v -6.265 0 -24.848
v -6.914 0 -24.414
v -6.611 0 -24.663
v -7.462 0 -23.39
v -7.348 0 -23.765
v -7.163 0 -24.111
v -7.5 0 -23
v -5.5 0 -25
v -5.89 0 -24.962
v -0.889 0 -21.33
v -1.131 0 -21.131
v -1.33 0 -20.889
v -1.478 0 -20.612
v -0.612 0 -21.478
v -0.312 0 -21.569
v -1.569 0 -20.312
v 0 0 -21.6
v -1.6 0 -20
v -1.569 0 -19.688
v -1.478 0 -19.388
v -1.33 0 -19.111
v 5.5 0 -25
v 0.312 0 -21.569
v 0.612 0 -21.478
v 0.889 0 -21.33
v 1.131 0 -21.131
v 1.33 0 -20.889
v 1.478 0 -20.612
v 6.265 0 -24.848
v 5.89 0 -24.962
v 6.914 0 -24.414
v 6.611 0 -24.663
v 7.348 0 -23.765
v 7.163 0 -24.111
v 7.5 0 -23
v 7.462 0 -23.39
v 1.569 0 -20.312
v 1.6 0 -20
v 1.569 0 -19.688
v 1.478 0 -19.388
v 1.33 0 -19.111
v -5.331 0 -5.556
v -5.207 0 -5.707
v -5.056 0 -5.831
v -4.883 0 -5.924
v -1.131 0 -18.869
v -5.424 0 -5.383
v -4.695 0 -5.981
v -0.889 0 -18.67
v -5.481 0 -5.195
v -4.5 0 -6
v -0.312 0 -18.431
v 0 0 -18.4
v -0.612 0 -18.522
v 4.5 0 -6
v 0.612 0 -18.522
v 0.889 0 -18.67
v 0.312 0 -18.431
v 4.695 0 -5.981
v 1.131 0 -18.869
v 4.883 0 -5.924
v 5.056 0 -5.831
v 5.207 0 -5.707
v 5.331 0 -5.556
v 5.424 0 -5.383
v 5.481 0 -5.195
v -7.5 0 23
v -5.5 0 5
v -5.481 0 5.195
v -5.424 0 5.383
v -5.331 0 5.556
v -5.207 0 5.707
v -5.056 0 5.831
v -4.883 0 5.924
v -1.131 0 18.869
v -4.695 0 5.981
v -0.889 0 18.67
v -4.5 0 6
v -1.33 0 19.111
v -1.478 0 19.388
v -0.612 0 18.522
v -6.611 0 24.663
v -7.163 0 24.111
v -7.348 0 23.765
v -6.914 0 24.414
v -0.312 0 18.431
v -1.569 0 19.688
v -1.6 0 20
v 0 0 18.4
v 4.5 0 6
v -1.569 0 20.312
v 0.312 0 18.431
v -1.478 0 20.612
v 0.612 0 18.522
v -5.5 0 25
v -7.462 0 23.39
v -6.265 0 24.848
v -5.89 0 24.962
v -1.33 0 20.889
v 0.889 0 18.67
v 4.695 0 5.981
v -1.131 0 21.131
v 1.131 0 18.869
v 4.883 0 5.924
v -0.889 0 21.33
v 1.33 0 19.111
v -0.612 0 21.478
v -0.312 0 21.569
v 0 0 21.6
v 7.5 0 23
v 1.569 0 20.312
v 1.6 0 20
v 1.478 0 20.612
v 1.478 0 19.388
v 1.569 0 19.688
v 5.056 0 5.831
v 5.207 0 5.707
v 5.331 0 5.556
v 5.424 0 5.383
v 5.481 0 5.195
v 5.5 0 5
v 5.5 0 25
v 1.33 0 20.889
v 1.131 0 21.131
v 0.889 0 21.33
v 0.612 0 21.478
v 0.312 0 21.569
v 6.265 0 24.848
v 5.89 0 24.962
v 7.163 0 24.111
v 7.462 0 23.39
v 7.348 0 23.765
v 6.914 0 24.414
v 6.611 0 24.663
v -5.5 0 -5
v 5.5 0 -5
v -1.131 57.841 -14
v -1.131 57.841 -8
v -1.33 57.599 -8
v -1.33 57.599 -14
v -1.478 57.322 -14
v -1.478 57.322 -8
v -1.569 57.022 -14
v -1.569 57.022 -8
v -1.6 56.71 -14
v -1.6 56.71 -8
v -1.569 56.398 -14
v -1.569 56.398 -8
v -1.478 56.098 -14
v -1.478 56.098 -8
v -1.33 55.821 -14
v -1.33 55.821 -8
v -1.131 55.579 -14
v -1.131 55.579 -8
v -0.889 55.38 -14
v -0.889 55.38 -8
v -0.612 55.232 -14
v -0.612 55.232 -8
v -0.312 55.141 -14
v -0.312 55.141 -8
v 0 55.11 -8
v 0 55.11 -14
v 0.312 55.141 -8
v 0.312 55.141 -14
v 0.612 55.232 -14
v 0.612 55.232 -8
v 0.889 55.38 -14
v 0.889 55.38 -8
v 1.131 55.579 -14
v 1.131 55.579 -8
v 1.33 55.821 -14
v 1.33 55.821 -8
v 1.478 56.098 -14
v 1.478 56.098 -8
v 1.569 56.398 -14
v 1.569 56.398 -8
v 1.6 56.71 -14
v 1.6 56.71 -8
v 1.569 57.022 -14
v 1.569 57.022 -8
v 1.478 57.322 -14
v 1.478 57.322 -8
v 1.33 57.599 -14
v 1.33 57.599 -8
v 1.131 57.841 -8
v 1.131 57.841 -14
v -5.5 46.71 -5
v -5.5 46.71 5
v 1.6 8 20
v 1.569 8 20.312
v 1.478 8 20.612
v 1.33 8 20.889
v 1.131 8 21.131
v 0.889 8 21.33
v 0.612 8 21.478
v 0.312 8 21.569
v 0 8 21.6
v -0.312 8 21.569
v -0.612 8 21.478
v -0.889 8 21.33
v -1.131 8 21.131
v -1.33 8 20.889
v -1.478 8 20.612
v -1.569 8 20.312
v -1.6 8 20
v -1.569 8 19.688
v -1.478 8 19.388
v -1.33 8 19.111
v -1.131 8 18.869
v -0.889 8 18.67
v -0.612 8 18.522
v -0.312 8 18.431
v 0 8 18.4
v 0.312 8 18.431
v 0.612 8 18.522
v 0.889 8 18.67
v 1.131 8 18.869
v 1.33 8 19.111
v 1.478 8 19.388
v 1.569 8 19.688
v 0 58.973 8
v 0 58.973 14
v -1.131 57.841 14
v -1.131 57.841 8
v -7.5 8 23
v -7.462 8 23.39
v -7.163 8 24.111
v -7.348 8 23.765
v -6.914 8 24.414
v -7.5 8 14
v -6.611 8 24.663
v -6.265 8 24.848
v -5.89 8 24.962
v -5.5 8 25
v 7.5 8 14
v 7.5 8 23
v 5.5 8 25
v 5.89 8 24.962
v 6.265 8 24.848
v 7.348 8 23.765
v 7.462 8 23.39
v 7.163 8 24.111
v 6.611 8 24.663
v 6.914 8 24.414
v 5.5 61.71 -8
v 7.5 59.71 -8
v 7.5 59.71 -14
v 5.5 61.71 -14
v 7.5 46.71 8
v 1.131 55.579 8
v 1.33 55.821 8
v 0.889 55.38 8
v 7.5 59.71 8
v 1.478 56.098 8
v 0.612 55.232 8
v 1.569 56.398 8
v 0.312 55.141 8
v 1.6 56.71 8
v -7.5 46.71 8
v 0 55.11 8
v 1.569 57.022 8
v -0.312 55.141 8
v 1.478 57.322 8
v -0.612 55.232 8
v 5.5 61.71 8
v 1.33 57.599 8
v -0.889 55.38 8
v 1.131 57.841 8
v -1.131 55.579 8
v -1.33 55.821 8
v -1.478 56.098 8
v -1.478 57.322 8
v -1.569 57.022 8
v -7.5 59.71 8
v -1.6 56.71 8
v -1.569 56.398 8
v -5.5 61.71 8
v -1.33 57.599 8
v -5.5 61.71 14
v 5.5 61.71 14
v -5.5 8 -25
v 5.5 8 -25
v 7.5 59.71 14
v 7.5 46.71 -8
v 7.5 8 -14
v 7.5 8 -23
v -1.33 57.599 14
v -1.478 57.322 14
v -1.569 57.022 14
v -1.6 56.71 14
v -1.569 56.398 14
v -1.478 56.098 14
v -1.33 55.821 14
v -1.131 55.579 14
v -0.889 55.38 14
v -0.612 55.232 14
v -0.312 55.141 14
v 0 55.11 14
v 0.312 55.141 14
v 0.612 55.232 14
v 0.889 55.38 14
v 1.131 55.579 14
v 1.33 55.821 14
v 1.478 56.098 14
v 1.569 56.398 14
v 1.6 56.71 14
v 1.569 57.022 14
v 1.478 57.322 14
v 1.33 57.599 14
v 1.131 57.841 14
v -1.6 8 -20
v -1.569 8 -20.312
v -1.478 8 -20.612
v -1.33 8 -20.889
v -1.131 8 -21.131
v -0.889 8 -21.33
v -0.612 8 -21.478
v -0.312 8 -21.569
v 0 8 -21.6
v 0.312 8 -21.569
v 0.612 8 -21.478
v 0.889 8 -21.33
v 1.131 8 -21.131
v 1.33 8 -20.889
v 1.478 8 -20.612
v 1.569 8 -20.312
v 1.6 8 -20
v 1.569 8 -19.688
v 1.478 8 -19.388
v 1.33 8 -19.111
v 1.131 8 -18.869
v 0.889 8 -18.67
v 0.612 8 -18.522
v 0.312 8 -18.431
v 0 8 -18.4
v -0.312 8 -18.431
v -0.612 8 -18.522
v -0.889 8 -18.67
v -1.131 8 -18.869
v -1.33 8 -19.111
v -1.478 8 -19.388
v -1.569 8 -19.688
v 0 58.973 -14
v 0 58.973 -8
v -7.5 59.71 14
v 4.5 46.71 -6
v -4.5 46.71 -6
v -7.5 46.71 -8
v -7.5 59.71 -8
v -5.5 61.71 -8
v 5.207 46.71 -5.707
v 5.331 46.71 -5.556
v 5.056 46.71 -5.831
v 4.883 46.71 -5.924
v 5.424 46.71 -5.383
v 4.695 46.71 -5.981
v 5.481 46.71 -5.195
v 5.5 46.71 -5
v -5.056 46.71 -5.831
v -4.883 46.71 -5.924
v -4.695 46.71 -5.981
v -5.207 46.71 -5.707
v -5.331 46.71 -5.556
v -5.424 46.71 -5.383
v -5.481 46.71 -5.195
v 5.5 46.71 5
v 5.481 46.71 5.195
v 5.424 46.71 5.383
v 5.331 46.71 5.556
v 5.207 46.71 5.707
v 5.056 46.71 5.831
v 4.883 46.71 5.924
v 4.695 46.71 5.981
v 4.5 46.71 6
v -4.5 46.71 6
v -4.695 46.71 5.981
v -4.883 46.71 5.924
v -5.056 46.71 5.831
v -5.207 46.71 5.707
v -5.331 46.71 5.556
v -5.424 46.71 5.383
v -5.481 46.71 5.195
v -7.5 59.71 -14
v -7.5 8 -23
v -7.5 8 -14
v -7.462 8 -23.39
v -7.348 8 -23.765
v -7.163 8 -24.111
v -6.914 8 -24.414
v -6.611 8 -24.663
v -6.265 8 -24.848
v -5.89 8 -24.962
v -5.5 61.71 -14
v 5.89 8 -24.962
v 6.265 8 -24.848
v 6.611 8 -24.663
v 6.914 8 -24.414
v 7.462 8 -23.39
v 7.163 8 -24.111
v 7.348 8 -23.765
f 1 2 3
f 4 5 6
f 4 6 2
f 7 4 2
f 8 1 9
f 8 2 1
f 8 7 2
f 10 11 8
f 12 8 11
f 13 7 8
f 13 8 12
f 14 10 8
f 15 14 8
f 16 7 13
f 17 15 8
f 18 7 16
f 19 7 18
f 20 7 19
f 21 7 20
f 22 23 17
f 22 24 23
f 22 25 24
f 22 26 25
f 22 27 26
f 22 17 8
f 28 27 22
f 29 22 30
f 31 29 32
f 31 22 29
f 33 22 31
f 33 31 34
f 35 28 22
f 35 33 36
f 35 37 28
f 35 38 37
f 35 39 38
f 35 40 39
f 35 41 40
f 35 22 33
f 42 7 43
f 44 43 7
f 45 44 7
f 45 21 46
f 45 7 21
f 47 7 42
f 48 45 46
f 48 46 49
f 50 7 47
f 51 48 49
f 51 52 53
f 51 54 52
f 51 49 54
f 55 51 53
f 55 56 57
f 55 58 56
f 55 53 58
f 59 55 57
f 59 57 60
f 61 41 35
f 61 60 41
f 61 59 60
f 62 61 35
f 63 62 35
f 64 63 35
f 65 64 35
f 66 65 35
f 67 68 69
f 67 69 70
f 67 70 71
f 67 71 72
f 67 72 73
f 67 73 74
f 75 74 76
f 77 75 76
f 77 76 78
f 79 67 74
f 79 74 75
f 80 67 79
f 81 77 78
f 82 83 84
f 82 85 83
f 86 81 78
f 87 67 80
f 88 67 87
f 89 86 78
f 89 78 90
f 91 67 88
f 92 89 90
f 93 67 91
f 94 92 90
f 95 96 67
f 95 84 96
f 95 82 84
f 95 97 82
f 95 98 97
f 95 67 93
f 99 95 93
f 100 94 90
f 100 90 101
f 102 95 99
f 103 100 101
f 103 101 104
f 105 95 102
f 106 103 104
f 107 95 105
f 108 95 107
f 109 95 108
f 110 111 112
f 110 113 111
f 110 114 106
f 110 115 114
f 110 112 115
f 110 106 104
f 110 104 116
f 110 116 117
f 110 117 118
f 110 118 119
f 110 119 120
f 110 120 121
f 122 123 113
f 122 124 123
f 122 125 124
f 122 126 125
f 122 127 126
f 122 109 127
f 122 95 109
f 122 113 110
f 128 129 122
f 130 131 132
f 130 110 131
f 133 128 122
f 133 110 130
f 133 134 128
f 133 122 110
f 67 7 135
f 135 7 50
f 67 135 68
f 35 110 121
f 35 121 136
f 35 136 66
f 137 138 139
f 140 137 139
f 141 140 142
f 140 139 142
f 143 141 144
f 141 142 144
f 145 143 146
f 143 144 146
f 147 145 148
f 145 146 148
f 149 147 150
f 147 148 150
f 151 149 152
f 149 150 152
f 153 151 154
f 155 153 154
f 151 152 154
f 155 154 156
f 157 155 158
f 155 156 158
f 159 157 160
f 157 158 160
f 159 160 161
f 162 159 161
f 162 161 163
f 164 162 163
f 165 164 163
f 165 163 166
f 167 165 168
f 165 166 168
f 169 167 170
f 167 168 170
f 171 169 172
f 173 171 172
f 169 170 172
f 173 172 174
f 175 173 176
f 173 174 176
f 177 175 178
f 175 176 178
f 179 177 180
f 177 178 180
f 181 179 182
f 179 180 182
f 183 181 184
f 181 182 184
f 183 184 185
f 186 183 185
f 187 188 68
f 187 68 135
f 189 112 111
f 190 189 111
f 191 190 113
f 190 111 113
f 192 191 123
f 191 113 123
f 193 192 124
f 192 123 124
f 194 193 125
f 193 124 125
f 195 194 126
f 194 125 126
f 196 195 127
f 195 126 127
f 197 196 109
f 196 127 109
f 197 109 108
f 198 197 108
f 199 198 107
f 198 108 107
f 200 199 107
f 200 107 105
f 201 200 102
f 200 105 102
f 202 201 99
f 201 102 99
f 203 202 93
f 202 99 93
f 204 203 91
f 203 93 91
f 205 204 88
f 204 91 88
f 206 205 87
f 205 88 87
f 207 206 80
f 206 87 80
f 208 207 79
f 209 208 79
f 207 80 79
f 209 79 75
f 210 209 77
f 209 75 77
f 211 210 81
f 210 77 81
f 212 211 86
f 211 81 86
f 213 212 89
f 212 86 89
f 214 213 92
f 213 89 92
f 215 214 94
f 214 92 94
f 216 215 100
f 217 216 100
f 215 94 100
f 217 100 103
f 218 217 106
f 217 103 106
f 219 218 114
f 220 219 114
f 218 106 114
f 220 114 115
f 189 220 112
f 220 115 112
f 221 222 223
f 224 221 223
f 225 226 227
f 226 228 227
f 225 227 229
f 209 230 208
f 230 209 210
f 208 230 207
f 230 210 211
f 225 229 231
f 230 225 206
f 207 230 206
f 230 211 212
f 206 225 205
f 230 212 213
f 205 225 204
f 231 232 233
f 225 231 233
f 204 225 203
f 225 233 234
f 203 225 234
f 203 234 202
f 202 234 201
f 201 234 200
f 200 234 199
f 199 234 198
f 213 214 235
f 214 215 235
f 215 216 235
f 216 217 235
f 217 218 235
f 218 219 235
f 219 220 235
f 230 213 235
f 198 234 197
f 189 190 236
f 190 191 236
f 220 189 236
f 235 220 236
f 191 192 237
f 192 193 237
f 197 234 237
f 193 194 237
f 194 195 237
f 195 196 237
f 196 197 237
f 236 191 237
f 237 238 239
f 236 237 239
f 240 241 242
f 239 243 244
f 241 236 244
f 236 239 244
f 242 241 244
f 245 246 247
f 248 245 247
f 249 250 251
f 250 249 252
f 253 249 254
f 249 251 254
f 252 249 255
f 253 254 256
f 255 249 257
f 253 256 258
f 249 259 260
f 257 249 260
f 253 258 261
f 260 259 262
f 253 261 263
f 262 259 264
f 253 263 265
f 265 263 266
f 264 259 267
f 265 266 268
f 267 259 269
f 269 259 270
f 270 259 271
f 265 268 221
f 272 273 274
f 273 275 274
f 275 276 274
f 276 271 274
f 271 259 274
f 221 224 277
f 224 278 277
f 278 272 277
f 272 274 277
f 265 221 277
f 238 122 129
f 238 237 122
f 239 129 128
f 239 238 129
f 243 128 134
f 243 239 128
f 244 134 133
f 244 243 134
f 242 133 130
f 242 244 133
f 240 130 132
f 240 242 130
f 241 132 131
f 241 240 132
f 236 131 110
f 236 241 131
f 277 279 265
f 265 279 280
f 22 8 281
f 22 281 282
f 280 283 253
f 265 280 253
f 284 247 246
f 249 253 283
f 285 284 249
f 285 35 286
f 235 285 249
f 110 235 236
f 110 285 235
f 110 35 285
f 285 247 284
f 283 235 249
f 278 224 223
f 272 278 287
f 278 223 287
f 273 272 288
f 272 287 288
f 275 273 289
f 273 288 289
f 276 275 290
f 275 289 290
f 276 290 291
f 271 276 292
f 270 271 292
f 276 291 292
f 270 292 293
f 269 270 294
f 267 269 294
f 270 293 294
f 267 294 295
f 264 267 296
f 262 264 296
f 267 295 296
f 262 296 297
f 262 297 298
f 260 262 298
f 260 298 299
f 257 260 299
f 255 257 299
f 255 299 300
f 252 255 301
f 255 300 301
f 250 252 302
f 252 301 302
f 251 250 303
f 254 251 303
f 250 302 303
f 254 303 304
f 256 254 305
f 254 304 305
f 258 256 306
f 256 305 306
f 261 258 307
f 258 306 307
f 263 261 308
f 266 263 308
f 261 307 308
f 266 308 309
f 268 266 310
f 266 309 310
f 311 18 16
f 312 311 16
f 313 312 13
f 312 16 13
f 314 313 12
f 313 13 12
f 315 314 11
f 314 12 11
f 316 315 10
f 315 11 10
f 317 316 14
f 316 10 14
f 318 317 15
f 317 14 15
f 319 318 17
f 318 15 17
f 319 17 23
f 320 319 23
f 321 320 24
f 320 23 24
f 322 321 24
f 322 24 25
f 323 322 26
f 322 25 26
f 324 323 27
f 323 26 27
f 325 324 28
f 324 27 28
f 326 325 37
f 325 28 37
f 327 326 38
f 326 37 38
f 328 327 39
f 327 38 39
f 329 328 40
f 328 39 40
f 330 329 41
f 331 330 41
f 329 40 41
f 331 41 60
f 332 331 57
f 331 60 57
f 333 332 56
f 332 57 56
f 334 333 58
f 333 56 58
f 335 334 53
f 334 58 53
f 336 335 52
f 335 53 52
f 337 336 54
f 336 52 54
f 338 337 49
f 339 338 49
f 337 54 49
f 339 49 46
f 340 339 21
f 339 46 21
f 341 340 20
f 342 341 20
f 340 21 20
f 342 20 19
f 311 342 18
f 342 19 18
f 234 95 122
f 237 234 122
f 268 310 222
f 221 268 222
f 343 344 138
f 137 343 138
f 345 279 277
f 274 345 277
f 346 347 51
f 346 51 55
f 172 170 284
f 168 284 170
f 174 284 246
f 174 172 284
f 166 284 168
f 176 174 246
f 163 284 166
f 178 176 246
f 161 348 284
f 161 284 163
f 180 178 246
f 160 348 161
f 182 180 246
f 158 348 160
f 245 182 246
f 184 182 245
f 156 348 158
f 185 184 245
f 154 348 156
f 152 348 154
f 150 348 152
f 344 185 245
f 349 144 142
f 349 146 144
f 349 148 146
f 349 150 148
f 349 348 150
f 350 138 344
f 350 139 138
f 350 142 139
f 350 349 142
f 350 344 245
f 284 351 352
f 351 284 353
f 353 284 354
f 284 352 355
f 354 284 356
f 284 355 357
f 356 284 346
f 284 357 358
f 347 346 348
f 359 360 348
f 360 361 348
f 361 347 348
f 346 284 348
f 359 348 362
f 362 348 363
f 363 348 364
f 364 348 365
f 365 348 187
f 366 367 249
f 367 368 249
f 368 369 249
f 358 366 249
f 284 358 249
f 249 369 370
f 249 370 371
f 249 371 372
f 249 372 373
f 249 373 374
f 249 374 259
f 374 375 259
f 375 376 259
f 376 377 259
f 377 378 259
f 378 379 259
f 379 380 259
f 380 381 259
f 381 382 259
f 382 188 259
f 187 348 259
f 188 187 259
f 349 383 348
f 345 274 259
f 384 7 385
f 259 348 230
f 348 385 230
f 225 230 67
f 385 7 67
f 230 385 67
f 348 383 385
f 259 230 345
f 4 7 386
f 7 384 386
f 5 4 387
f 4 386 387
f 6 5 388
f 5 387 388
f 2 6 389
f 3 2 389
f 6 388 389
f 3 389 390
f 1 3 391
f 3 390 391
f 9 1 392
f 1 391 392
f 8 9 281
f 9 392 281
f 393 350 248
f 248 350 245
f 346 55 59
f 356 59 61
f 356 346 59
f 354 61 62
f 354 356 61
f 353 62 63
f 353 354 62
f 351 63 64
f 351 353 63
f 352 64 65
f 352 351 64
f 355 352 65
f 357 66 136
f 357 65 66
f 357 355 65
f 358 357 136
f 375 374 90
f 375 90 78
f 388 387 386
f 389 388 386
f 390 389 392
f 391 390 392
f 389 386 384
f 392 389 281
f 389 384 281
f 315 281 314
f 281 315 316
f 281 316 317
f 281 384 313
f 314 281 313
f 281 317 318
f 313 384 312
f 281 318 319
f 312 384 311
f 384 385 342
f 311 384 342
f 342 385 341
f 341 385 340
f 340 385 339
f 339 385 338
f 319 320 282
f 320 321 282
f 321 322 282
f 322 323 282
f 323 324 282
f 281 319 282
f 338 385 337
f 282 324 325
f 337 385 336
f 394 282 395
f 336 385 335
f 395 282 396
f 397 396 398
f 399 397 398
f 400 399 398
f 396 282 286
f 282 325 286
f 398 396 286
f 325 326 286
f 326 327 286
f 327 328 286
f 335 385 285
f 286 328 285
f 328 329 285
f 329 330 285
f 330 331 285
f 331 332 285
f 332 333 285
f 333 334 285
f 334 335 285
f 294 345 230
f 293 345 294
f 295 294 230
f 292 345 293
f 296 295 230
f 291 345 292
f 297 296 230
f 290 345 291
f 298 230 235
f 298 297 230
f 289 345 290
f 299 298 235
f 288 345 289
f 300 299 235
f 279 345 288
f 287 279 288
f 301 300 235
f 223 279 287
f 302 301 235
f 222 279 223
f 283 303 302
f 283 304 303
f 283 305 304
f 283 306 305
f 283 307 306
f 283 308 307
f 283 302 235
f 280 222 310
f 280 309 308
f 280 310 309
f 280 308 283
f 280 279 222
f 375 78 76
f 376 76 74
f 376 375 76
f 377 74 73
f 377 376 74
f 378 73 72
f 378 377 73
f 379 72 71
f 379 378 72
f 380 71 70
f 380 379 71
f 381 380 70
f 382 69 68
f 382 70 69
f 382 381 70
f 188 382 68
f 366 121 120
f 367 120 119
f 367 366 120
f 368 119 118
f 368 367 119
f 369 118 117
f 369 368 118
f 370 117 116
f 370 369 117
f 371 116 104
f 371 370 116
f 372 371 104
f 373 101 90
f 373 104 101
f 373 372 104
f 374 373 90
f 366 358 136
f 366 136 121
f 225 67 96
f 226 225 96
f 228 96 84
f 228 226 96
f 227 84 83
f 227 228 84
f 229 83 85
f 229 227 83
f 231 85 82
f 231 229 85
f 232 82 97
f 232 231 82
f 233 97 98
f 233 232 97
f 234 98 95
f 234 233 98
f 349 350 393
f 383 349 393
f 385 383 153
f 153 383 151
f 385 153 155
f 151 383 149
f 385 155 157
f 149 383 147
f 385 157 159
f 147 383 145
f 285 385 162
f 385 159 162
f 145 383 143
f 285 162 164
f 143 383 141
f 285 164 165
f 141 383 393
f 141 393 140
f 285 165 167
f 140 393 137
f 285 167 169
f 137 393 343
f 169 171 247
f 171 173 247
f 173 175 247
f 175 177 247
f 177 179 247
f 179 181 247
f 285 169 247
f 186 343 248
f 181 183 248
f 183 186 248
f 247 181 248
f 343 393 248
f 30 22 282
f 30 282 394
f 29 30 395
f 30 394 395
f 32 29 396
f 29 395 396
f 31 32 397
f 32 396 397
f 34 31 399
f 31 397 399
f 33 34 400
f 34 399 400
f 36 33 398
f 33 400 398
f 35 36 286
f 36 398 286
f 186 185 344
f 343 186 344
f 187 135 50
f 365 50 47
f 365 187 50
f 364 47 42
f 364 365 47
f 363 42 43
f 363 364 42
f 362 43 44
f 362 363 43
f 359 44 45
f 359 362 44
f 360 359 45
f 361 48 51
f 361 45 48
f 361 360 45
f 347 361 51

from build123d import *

# Parameters (mm, degrees)
SKETCH_1_W          = 15
SKETCH_1_H          = 61.71
EXTRUDE_1_DEPTH     = 14
SKETCH_2_W          = 16
SKETCH_2_H          = 15
CUT_EXTRUDE_1_DEPTH = 28
SKETCH_3_W          = 15
SKETCH_3_H          = 11
SKETCH_3_R          = 1.6
EXTRUDE_2_DEPTH     = 8
CUT_EXTRUDE_2_DEPTH = 61
CHAMFER_1_SIZE      = 2
FILLET_1_R          = 2


with BuildPart() as part:
    # 草图1 → 凸台-拉伸1 (new, symmetric)
    with BuildSketch(Plane.XY):
        with Locations((0, 30.855)):
            Rectangle(SKETCH_1_W, SKETCH_1_H)
        with BuildLine():
            Line((0, 58.9727417), (-1.13137085, 57.84137085))
            ThreePointArc((-1.13137085, 57.84137085), (0, 55.11), (1.13137085, 57.84137085))
            Line((1.13137085, 57.84137085), (0, 58.9727417))
        make_face(mode=Mode.SUBTRACT)
    extrude(amount=EXTRUDE_1_DEPTH, both=True)

    # 草图2 → 切除-拉伸1 (cut)
    with BuildSketch(Plane.ZY.offset(7.5)):
        with Locations((0, 54.21)):
            Rectangle(SKETCH_2_W, SKETCH_2_H)
    extrude(amount=-CUT_EXTRUDE_1_DEPTH, mode=Mode.SUBTRACT)

    # 草图3 → 凸台-拉伸2 (add)
    # profile 1 of 2: a face of its own
    with BuildSketch(Plane.XZ):
        with Locations((0, 19.5)):
            Rectangle(SKETCH_3_W, SKETCH_3_H)
        with Locations((0, 20)):
            Circle(SKETCH_3_R, mode=Mode.SUBTRACT)
    # profile 2 of 2: a face of its own
    with BuildSketch(Plane.XZ):
        with Locations((0, -19.5)):
            Rectangle(SKETCH_3_W, SKETCH_3_H)
        with Locations(Location((0, -20, 0), (0, 0, 180))):
            Circle(SKETCH_3_R, mode=Mode.SUBTRACT)
    extrude(amount=-EXTRUDE_2_DEPTH)

    # 草图4 → 切除-拉伸2 (cut)
    with BuildSketch(Plane(origin=(0, 46.71, 0), x_dir=(1, 0, 0), z_dir=(0, 1, 0))):
        with BuildLine():
            Line((4.5, -6), (-4.5, -6))
            ThreePointArc((-4.5, -6), (-5.207106781, -5.707106781), (-5.5, -5))
            Line((-5.5, -5), (-5.5, 5))
            ThreePointArc((-5.5, 5), (-5.207106781, 5.707106781), (-4.5, 6))
            Line((-4.5, 6), (4.5, 6))
            ThreePointArc((4.5, 6), (5.207106781, 5.707106781), (5.5, 5))
            Line((5.5, 5), (5.5, -5))
            ThreePointArc((5.5, -5), (5.207106781, -5.707106781), (4.5, -6))
        make_face()
    extrude(amount=-CUT_EXTRUDE_2_DEPTH, mode=Mode.SUBTRACT)

    # 倒角1
    chamfer_1_edges = [part.edges().sort_by_distance(p)[0] for p in [
        (-7.5, 61.71, -11),
        (7.5, 61.71, -11),
        (-7.5, 61.71, 11),
        (7.5, 61.71, 11),
    ]]
    chamfer(chamfer_1_edges, length=CHAMFER_1_SIZE)

    # 圆角1
    fillet_1_edges = [part.edges().sort_by_distance(p)[0] for p in [
        (7.5, 4, 25),
        (-7.5, 4, 25),
        (7.5, 4, -25),
        (-7.5, 4, -25),
    ]]
    fillet(fillet_1_edges, radius=FILLET_1_R)


solid = part.part
